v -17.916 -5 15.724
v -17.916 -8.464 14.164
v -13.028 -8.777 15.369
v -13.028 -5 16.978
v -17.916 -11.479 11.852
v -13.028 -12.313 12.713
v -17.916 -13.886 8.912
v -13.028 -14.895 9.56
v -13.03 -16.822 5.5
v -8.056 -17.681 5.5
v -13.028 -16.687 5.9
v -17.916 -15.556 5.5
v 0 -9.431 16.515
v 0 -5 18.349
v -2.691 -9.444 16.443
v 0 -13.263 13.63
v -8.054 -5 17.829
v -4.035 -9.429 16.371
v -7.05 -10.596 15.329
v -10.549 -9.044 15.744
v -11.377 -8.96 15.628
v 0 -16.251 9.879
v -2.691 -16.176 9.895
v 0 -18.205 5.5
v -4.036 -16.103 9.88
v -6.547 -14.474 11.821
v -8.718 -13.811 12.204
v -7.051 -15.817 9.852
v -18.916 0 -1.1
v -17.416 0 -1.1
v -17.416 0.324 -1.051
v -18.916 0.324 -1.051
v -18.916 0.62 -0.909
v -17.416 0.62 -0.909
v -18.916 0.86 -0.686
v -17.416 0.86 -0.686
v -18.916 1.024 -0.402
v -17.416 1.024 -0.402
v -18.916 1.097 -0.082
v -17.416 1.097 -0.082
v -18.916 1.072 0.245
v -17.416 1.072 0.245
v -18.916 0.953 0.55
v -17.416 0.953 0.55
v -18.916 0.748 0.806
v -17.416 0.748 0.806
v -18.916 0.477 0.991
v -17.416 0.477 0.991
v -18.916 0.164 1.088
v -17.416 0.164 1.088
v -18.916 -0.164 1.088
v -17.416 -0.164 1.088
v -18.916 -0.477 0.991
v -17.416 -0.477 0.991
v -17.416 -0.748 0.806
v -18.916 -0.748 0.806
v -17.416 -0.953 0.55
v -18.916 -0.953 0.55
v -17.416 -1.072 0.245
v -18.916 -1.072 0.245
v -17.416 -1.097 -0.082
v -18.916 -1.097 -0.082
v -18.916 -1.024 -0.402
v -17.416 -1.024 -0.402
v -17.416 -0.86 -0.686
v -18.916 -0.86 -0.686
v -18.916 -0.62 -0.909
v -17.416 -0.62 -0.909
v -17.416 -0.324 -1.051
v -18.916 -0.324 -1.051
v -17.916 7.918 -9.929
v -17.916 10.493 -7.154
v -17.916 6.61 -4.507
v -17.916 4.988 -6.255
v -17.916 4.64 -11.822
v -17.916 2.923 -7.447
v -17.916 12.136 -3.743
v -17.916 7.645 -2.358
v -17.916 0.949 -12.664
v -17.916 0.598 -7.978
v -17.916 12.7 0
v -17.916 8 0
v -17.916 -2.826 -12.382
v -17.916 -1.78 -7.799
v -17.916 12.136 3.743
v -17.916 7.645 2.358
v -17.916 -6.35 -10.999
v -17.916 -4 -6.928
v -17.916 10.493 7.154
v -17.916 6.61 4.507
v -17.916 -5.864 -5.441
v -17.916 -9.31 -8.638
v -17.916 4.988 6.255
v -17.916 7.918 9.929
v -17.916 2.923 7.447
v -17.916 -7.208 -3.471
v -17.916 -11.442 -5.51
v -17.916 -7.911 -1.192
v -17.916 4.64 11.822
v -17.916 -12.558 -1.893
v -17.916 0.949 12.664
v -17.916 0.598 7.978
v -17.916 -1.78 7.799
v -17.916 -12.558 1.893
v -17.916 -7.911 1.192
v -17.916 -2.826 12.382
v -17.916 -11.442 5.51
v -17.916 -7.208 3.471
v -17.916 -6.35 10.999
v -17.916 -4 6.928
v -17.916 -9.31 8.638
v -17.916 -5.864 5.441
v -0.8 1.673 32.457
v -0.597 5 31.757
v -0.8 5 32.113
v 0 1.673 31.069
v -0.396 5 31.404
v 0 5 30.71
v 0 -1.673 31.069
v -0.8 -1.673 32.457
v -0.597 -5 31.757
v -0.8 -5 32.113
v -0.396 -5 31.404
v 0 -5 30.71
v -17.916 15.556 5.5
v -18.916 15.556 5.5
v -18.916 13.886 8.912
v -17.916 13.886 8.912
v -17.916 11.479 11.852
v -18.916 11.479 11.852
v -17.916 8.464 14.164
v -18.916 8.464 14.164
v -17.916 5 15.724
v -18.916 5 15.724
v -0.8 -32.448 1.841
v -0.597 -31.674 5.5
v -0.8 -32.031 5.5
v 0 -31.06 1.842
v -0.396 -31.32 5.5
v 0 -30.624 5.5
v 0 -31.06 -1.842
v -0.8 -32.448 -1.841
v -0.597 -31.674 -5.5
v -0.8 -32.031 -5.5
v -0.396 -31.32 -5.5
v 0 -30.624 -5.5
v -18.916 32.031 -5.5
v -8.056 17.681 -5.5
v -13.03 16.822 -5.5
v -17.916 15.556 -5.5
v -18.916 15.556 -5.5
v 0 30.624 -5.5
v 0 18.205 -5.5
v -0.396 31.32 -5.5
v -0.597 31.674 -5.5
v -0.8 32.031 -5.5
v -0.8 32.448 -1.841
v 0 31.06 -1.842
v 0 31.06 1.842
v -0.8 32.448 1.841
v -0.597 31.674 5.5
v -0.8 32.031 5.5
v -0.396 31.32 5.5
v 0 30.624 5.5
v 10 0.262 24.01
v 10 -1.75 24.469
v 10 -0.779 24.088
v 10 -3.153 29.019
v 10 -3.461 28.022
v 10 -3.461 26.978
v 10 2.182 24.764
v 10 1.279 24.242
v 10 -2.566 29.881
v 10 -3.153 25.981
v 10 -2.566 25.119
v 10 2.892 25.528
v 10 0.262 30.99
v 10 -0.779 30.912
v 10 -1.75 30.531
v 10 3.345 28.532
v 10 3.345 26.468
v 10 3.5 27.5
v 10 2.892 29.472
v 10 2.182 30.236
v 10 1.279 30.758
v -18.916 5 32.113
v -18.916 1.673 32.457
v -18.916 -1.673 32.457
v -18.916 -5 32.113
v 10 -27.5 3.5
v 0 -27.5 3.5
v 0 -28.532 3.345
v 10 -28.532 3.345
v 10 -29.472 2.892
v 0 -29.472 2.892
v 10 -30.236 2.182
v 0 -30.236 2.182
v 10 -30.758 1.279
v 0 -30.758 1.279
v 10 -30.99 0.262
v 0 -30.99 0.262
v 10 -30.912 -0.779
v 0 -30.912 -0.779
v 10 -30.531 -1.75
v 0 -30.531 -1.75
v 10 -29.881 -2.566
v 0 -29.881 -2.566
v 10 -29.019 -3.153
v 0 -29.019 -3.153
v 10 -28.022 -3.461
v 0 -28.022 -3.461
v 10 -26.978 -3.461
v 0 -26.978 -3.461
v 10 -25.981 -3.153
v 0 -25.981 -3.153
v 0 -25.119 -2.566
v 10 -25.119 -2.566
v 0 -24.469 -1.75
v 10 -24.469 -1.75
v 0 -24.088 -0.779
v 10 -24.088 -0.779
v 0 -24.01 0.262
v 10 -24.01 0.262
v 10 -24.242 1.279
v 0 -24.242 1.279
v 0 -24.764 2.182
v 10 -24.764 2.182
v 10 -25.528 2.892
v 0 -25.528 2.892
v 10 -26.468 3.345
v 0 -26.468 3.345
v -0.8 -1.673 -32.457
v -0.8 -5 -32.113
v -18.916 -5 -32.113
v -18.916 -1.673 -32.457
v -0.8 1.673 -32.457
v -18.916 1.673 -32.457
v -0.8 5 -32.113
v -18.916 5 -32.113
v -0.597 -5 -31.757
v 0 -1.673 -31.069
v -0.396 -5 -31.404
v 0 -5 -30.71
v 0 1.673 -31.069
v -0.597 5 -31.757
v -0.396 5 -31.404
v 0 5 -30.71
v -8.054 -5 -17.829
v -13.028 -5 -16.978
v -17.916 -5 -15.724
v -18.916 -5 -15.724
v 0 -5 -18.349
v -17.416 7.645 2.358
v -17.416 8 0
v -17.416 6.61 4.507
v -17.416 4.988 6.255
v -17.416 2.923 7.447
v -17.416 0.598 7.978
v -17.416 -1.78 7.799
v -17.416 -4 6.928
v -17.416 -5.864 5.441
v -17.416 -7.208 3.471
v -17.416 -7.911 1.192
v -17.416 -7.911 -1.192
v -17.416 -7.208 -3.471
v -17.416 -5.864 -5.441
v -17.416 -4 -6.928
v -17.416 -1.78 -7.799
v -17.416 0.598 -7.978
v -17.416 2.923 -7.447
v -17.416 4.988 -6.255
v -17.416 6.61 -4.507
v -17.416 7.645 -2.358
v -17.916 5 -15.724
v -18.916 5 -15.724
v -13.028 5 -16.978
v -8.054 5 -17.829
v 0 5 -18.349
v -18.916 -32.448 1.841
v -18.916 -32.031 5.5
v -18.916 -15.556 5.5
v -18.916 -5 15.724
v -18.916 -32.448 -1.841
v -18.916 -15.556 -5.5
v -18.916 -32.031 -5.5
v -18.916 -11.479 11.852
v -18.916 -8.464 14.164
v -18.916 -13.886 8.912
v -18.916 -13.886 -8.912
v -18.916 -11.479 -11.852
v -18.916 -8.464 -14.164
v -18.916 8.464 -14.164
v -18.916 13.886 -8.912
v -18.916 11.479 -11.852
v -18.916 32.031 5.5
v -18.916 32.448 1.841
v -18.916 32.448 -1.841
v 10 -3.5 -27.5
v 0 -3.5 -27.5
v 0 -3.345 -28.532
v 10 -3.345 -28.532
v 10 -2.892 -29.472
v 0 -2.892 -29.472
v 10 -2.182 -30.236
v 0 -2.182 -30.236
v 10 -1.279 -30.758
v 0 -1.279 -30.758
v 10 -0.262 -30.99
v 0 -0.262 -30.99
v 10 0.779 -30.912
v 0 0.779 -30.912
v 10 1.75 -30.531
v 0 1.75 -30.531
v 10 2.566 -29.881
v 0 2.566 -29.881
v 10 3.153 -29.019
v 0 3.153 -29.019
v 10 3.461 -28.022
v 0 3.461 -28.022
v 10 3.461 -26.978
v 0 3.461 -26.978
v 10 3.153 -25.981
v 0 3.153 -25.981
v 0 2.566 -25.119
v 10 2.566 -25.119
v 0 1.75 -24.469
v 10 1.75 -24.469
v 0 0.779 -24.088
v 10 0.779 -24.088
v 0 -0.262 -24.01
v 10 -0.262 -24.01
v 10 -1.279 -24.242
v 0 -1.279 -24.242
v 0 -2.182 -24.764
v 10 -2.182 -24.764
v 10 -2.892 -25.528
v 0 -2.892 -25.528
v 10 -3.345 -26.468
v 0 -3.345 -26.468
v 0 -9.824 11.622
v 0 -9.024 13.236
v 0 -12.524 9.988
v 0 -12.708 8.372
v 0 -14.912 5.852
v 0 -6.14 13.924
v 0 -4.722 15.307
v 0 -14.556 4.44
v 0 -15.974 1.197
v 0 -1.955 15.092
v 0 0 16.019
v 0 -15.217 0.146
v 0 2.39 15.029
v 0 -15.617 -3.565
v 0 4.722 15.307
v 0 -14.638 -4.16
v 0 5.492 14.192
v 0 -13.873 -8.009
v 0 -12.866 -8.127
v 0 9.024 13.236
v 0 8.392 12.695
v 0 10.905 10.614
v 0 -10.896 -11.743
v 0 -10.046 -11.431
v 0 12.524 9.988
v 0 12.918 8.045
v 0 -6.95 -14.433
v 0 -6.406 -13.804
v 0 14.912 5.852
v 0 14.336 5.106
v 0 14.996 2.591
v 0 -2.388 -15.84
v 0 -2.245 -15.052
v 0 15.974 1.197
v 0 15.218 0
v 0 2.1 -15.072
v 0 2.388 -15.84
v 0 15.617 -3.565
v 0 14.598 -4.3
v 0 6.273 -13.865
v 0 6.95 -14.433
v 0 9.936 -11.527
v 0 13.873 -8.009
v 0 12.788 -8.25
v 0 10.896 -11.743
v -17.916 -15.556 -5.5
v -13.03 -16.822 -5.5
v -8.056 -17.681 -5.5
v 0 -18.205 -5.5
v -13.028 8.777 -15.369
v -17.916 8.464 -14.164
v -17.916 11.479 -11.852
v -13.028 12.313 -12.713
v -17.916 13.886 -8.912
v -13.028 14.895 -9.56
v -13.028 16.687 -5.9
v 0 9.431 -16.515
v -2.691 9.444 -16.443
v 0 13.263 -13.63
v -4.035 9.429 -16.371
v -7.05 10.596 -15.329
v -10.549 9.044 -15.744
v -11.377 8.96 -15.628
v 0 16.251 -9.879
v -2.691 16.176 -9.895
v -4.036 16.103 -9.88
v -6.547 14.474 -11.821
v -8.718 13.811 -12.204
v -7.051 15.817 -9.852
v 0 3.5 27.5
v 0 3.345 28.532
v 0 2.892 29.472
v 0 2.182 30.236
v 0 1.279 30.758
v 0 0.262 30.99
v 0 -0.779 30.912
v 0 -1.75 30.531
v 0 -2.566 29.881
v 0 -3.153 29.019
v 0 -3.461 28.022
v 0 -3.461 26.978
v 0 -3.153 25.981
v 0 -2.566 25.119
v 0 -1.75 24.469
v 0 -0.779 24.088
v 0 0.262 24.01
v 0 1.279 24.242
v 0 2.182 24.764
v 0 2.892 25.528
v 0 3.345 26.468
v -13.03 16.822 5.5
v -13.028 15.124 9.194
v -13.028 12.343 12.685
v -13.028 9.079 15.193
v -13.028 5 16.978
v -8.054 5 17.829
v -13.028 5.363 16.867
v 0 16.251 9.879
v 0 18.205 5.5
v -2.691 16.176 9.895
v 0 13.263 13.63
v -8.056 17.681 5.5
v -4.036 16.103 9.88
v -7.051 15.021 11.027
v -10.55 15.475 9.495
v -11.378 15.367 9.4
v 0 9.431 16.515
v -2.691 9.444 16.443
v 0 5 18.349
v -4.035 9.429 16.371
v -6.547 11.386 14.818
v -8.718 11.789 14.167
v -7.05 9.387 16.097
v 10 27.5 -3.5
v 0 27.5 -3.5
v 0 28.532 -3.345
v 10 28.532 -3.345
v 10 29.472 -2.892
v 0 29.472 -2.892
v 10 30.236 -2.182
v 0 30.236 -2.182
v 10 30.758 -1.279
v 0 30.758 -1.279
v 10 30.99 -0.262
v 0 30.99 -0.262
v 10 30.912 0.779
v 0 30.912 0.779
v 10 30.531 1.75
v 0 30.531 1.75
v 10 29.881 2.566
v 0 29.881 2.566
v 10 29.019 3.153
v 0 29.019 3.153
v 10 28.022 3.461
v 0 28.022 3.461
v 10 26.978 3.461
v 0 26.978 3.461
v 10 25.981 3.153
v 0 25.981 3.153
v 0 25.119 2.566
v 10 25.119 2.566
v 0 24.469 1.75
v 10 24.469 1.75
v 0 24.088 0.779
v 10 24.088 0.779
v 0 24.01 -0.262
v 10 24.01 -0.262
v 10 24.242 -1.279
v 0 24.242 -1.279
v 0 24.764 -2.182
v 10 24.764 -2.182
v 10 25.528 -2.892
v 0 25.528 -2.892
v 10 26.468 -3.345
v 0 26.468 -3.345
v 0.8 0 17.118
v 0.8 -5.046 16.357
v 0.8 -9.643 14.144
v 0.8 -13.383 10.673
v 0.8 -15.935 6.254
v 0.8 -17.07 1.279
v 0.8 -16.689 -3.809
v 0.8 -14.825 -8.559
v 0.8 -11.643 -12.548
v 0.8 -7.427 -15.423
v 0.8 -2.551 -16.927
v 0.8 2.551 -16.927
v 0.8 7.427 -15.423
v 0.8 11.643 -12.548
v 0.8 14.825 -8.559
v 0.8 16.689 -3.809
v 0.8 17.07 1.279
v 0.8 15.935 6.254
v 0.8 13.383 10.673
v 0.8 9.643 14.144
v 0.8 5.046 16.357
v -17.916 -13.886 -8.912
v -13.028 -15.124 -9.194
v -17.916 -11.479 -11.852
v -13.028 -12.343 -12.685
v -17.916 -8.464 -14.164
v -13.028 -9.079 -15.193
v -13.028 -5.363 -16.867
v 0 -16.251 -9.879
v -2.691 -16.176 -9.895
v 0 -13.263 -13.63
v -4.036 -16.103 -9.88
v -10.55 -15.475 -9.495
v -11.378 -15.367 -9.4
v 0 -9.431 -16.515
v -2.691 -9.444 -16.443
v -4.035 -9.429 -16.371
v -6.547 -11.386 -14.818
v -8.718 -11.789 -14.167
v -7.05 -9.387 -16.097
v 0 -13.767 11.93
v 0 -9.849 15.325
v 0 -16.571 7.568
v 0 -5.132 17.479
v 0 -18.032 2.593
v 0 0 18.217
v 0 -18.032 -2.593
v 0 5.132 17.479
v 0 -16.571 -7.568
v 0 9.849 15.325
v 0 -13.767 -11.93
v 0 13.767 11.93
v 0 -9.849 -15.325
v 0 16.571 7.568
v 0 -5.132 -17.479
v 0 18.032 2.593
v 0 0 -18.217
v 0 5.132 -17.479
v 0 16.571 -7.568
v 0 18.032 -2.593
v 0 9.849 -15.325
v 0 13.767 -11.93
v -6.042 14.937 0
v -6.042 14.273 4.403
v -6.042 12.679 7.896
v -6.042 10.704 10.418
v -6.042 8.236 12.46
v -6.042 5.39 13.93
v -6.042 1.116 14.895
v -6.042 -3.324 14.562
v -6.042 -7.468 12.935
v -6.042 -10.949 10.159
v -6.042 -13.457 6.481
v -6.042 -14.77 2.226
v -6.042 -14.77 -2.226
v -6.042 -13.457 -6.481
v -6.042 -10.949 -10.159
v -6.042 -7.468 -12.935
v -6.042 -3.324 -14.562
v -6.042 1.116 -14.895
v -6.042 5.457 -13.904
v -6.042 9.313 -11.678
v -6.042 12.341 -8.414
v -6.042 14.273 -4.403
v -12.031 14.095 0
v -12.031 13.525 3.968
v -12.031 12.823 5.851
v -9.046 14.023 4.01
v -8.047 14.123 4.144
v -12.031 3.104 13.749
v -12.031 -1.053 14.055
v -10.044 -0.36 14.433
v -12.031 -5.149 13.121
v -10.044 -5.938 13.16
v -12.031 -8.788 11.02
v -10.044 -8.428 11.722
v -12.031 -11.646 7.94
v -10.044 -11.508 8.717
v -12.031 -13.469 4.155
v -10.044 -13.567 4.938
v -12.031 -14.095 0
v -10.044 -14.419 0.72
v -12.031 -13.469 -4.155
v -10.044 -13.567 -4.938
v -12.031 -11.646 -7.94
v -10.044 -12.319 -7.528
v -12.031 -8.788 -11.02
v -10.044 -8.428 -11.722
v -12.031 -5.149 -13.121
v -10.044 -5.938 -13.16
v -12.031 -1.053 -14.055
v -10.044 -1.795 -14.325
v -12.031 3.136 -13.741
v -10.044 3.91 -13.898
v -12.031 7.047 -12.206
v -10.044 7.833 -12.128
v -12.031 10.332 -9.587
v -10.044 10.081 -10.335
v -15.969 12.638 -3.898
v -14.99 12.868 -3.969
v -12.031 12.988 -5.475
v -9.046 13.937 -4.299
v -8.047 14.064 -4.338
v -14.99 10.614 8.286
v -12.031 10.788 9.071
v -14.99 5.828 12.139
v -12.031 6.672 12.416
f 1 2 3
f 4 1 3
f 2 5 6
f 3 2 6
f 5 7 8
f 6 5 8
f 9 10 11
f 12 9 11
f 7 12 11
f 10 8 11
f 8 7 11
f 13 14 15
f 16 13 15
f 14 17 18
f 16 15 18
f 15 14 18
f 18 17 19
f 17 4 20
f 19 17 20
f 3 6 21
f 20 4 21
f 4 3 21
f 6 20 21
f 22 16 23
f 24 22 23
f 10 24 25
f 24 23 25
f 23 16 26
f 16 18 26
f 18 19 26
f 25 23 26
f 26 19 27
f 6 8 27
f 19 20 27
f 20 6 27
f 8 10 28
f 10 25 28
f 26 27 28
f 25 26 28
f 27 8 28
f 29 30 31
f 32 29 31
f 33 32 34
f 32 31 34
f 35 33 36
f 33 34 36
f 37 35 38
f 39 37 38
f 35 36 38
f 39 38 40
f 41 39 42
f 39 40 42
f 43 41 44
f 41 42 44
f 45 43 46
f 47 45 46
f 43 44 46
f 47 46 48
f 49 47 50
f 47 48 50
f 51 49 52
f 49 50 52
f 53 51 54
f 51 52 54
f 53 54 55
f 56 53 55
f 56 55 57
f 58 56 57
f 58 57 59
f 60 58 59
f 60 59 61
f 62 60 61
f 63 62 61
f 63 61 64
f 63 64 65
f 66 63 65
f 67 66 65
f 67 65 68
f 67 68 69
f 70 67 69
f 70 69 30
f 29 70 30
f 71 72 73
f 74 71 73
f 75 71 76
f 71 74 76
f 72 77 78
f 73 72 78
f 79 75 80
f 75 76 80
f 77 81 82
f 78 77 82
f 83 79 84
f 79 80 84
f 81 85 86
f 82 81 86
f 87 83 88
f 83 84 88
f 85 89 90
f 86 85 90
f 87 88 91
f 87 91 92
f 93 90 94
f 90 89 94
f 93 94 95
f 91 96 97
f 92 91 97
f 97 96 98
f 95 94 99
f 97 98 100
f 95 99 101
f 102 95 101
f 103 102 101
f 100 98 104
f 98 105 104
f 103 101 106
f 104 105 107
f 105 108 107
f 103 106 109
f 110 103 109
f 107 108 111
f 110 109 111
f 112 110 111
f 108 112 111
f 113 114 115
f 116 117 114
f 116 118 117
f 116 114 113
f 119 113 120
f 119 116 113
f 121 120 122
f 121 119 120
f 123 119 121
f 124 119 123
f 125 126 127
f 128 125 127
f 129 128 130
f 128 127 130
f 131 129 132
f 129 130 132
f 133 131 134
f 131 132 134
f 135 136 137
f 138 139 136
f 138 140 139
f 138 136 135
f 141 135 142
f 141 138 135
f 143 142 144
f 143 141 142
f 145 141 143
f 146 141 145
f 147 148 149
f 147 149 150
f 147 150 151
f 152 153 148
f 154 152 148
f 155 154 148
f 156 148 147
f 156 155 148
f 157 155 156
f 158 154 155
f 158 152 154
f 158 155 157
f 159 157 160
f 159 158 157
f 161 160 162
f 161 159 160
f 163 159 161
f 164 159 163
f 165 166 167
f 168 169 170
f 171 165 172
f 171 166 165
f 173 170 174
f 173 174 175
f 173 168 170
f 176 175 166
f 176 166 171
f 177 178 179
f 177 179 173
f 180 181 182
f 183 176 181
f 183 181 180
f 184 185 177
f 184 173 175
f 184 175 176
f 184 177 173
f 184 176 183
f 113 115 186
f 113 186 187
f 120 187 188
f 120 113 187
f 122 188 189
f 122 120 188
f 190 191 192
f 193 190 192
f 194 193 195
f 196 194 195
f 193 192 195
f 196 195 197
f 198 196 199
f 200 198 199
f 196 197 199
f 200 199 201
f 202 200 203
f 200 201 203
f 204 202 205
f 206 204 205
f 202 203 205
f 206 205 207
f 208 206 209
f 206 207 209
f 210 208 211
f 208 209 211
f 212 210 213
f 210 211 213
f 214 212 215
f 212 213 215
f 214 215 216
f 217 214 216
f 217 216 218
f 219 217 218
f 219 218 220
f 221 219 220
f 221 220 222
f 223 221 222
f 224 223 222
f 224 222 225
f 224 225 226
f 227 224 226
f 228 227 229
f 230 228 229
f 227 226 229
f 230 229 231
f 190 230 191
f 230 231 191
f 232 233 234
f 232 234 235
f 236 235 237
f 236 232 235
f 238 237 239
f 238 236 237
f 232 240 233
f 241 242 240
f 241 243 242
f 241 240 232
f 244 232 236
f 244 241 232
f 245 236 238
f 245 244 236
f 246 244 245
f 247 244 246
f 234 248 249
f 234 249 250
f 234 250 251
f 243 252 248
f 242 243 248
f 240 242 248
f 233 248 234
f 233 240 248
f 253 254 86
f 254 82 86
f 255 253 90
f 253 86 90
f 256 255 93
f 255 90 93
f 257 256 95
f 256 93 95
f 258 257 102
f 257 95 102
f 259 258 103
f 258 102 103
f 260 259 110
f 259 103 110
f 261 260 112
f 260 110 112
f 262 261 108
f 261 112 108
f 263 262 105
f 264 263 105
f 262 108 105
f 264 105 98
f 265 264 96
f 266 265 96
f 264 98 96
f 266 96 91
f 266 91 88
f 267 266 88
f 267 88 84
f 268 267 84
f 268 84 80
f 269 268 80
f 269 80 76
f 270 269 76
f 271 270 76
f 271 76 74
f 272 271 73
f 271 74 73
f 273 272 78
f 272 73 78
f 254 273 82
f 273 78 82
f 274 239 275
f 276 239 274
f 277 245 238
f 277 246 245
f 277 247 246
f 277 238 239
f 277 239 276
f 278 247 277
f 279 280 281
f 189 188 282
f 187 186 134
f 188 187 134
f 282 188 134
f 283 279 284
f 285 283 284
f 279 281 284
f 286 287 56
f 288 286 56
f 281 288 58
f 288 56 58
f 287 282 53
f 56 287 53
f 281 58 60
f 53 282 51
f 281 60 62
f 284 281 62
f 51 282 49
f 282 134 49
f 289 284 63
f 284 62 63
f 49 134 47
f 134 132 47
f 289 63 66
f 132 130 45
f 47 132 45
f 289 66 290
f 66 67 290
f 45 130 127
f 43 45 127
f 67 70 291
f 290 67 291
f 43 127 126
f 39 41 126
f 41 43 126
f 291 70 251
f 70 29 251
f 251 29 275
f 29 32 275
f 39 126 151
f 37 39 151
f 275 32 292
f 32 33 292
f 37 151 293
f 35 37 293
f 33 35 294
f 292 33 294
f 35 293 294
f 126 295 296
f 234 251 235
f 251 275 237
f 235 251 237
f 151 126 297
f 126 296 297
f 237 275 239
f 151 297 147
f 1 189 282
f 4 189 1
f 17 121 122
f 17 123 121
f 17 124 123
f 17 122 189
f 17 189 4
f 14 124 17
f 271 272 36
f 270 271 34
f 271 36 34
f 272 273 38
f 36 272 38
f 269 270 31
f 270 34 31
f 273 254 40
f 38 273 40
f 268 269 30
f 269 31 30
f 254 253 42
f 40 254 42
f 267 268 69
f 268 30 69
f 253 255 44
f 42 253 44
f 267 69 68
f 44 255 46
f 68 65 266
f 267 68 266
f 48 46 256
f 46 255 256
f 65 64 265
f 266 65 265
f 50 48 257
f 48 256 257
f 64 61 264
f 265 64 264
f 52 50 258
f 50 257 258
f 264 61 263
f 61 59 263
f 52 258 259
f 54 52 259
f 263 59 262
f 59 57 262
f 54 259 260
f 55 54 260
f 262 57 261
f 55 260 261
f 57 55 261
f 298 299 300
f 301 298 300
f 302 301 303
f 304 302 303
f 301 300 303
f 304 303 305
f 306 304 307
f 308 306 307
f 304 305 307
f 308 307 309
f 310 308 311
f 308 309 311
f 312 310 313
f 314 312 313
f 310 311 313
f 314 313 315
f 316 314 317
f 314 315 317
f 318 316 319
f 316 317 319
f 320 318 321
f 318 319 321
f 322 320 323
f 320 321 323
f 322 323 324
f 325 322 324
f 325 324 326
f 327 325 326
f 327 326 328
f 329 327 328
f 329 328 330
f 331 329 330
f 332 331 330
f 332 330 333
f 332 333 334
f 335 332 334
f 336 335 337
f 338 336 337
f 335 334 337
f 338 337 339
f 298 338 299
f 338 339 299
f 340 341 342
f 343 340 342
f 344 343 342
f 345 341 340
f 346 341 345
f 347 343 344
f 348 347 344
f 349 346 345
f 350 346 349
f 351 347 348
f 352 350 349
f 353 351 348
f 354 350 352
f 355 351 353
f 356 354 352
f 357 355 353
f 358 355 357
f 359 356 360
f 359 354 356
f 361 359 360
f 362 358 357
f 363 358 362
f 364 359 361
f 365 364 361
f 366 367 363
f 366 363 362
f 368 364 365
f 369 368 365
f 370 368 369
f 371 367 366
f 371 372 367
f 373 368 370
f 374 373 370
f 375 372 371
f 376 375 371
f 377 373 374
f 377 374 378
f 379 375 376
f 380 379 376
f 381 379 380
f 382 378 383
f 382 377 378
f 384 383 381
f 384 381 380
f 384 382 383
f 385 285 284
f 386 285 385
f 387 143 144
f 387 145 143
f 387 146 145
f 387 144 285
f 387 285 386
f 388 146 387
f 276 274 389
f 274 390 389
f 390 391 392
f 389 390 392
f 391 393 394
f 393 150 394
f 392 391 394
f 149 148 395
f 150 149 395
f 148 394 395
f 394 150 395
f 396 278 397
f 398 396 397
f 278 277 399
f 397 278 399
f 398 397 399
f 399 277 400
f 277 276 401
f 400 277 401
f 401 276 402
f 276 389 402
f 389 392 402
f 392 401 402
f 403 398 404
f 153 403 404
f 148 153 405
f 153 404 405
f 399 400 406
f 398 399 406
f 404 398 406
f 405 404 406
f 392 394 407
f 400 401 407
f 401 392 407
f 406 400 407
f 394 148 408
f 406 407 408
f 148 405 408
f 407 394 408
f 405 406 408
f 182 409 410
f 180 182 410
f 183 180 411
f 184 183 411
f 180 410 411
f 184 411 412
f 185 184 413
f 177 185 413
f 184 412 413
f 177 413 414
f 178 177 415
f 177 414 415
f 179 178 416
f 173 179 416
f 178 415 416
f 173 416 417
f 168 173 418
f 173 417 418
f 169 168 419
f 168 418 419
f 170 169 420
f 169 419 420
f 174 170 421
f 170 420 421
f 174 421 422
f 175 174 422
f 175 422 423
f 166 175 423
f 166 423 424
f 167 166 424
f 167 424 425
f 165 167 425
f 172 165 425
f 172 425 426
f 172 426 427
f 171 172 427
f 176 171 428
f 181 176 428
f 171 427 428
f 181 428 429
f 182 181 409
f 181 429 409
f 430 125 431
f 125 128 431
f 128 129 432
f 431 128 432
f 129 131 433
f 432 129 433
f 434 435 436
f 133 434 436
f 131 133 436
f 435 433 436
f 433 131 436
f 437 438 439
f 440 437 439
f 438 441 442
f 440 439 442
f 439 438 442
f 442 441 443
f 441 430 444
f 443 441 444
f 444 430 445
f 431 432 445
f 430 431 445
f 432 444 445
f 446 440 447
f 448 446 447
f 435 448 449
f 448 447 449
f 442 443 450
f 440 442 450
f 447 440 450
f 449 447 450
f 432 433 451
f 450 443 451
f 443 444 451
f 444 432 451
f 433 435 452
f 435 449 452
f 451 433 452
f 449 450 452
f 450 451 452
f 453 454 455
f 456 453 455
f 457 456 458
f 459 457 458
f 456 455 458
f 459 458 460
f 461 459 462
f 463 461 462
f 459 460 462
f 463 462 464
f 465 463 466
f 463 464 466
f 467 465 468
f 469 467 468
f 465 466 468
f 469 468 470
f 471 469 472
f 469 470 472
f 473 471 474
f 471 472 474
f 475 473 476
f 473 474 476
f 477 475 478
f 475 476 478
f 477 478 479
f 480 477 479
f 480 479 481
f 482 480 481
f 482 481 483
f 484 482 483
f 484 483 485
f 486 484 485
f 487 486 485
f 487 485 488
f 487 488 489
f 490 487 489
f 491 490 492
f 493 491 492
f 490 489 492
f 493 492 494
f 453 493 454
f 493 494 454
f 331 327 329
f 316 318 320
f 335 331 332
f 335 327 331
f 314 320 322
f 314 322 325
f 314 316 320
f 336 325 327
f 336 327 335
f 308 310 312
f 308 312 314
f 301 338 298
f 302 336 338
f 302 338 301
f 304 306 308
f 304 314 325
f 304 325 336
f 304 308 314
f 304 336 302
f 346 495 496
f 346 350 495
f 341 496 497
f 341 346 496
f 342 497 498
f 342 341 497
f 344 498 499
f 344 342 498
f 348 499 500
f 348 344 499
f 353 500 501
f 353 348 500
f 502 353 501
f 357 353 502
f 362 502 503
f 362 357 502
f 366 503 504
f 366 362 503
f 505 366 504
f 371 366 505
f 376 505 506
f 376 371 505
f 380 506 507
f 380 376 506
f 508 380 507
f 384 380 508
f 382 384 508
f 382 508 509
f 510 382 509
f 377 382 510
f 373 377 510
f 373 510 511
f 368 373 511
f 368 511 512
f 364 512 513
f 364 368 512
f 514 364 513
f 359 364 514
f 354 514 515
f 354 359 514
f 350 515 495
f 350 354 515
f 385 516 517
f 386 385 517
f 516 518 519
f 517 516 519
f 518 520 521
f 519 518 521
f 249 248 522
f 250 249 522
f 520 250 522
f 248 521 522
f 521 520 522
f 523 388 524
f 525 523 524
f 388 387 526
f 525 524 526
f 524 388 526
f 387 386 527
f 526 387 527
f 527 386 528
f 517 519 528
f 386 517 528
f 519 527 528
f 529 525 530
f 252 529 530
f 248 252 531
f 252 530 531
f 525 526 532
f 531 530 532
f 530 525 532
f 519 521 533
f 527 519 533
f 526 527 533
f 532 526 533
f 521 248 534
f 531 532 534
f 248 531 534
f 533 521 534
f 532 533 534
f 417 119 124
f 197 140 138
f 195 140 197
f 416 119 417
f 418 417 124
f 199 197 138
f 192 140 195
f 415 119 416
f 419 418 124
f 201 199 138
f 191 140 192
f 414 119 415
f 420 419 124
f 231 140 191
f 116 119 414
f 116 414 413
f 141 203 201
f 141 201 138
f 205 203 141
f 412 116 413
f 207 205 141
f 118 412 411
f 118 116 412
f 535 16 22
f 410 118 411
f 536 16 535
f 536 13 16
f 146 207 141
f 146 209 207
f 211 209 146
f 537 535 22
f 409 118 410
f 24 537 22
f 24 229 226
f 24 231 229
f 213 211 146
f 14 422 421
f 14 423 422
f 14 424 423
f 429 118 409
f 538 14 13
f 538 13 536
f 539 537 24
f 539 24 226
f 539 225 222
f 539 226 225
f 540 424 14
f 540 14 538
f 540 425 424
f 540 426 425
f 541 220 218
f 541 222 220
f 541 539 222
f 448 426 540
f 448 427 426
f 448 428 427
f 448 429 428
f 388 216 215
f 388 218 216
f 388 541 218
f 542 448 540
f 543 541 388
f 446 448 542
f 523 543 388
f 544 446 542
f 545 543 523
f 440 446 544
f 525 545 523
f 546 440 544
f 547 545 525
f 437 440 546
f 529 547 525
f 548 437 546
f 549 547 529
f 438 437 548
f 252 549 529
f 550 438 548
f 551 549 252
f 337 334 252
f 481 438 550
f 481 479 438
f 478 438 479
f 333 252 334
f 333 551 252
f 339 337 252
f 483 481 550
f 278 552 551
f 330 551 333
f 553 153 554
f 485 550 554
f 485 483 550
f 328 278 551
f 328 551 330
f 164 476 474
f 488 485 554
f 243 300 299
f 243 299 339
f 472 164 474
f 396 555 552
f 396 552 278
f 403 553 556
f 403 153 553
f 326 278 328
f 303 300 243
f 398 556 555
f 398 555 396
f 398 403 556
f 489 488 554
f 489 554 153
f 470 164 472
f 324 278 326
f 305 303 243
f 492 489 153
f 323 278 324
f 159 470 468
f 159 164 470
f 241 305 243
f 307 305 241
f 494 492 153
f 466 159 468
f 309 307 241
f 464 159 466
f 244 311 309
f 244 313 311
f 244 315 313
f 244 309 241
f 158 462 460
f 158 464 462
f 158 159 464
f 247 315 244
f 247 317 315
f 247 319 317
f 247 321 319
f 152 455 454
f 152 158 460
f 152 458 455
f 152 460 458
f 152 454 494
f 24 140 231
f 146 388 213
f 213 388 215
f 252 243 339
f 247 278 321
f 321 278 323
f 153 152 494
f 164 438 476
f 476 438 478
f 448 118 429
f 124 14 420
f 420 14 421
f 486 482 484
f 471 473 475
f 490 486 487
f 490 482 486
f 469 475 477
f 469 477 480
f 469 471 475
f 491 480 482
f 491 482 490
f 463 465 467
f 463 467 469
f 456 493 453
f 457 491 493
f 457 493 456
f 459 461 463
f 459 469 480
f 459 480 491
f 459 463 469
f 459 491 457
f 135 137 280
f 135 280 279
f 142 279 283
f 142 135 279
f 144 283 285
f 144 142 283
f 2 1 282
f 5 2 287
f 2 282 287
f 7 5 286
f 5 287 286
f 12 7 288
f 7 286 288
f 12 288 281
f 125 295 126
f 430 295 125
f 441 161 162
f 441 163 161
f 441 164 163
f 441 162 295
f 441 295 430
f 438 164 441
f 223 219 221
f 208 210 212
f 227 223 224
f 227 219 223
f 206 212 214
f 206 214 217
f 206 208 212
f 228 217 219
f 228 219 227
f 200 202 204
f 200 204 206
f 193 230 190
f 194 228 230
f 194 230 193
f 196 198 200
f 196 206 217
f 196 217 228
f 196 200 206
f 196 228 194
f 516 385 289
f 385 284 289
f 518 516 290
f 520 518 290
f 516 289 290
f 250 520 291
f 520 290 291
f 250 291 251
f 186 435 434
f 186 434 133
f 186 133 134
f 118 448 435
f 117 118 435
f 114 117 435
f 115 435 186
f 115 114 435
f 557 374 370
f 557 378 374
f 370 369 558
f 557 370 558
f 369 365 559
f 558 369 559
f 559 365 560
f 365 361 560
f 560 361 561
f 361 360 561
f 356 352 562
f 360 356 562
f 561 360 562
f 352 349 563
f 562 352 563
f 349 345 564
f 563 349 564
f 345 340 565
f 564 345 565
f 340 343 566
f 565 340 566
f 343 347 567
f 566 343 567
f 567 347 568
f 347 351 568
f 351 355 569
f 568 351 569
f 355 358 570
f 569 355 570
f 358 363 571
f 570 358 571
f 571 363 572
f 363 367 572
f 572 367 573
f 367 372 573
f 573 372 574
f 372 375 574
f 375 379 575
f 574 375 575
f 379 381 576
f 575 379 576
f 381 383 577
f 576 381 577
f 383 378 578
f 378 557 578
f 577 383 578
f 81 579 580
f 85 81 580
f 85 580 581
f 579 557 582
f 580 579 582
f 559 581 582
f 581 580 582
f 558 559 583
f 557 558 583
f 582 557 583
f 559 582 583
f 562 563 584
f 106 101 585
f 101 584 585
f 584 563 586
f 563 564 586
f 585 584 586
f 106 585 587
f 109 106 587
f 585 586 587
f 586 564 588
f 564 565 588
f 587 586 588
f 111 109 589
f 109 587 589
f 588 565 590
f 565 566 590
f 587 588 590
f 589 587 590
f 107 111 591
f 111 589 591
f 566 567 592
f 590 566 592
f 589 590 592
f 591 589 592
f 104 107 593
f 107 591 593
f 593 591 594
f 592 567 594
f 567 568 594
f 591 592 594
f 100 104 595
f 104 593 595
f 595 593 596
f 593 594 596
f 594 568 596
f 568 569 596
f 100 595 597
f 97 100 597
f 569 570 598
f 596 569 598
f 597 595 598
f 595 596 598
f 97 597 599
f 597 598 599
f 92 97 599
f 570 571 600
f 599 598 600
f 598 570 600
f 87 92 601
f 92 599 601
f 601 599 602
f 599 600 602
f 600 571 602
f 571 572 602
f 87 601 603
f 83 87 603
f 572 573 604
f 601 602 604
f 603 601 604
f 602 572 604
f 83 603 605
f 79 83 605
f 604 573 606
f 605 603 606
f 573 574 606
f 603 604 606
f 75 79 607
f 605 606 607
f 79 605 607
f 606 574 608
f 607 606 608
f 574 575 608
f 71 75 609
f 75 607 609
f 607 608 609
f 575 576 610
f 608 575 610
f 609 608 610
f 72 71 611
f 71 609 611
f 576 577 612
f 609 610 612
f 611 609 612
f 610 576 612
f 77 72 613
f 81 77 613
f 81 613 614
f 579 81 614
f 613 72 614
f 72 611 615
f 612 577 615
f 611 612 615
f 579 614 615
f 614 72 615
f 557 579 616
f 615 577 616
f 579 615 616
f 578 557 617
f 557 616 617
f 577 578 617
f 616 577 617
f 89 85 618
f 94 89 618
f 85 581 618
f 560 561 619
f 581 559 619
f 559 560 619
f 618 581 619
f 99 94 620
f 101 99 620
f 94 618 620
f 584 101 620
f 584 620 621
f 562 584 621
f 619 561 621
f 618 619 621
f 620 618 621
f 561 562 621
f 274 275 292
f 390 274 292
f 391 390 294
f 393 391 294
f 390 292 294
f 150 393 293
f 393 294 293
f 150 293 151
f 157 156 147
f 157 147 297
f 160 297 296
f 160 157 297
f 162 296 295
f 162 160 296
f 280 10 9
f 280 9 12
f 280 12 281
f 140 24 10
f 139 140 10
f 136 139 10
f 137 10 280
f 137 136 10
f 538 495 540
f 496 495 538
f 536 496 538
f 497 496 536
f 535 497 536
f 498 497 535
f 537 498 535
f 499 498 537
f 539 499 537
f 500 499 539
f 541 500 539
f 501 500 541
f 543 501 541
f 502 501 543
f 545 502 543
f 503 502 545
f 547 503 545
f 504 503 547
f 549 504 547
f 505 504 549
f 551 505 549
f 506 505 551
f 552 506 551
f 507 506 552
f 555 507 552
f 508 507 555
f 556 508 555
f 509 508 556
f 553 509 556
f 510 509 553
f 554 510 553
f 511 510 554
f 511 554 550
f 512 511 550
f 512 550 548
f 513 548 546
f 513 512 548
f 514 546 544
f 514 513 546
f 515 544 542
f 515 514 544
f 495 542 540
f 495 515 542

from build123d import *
from OCP.BRepFilletAPI import BRepFilletAPI_MakeChamfer

# Parameters (mm, degrees)
BOSS_EXTRUDE1_DEPTH = 18.916428128
SKETCH3_R           = 1.15
CUT_EXTRUDE1_DEPTH  = 17.416428128
CUT_EXTRUDE3_REACH  = 51.702
SKETCH10_R          = 1.1
SKETCH8_R           = 3.5
BOSS_EXTRUDE2_DEPTH = 10
CIRPATTERN2_COUNT   = 4
CHAMFER1_SIZE       = 0.8
CHAMFER1_SIZE2      = 1.385640646


# Read off the part's stored shape, not the designer's step: Roller coating 12, Roller core 12 coated
with BuildPart() as part:
    # Roller coating 12 outline → Roller coating 12 (revolve)
    with BuildSketch(Plane.YX):
        with BuildLine():
            ThreePointArc((12.7, -17.916428128), (15.217989764, 0), (12.7, 17.916428128))
            Line((12.7, 17.916428128), (8, 17.916428128))
            Line((8, 17.916428128), (8, 17.416428128))
            Line((8, 17.416428128), (12.322080058, 17.416428128))
            ThreePointArc((12.322080058, 17.416428128), (14.717989764, 0), (12.322080058, -17.416428128))
            Line((12.322080058, -17.416428128), (8, -17.416428128))
            Line((8, -17.416428128), (8, -17.916428128))
            Line((8, -17.916428128), (12.7, -17.916428128))
        make_face()
    revolve(axis=Axis((0, 0, 0), (1, 0, 0)))


with BuildPart() as body_2:
    # Roller core 12 coated outline → Roller core 12 coated (revolve)
    with BuildSketch(Plane.YX):
        with BuildLine():
            Line((1.15, 17.416428128), (1.15, -17.416428128))
            Line((1.15, -17.416428128), (12.322080058, -17.416428128))
            ThreePointArc((12.322080058, -17.416428128), (14.717989764, 0), (12.322080058, 17.416428128))
            Line((12.322080058, 17.416428128), (1.15, 17.416428128))
        make_face()
    revolve(axis=Axis((0, 0, 0), (1, 0, 0)))


with BuildPart() as part_1:
    add(part.part)

    # Combine1: union body 2
    add(body_2.part)


with BuildPart() as body_2_2:
    # Sketch1 → Revolve1 (revolve)
    with BuildSketch(Plane.XY, mode=Mode.PRIVATE) as revolve1_sk:
        with BuildLine():
            Line((0, 0), (0, 15.217989764))
            Line((0, 15.217989764), (0, 19.017989764))
            ThreePointArc((0, 19.017989764), (-9.046251562, 18.385414232), (-17.916428128, 16.5))
            Line((-17.916428128, 16.5), (-18.916428128, 16.5))
            Line((-18.916428128, 16.5), (-18.916428128, 0))
            Line((-18.916428128, 0), (0, 0))
        make_face()
    revolve(revolve1_sk.sketch.rotate(Axis((-18.916428128, 0, 0), (1, 0, 0)), 270), axis=Axis((-18.916428128, 0, 0), (1, 0, 0)))

    # Sketch5 → Boss-Extrude1 (add)
    with BuildSketch(Plane(origin=(0, 0, 0), x_dir=(0, 0, -1), z_dir=(1, 0, 0))):
        with BuildLine():
            Line((5.5, -32.031234756), (5.5, -15.556349186))
            ThreePointArc((5.5, -15.556349186), (0, -16.5), (-5.5, -15.556349186))
            Line((-5.5, -15.556349186), (-5.5, -32.031234756))
            ThreePointArc((-5.5, -32.031234756), (0, -32.5), (5.5, -32.031234756))
        make_face()
        with BuildLine():
            Line((-5.5, 32.031234756), (-5.5, 15.556349186))
            ThreePointArc((-5.5, 15.556349186), (0, 16.5), (5.5, 15.556349186))
            Line((5.5, 15.556349186), (5.5, 32.031234756))
            ThreePointArc((5.5, 32.031234756), (0, 32.5), (-5.5, 32.031234756))
        make_face()
        with BuildLine():
            Line((32.113081447, 5), (15.724185194, 5))
            ThreePointArc((15.724185194, 5), (16.5, 0), (15.724185194, -5))
            Line((15.724185194, -5), (32.113081447, -5))
            ThreePointArc((32.113081447, -5), (32.5, 0), (32.113081447, 5))
        make_face()
        with BuildLine():
            Line((-32.113081447, -5), (-15.724185194, -5))
            ThreePointArc((-15.724185194, -5), (-16.5, 0), (-15.724185194, 5))
            Line((-15.724185194, 5), (-32.113081447, 5))
            ThreePointArc((-32.113081447, 5), (-32.5, 0), (-32.113081447, -5))
        make_face()
    extrude(amount=-BOSS_EXTRUDE1_DEPTH)

    # Combine2: cut part
    add(part_1.part, mode=Mode.SUBTRACT)

    # Sketch3 → Cut-Extrude1 (cut)
    with BuildSketch(Plane(origin=(0, 0, 0), x_dir=(0, 0, -1), z_dir=(1, 0, 0))):
        Circle(SKETCH3_R)
    extrude(amount=-CUT_EXTRUDE1_DEPTH, mode=Mode.SUBTRACT)

    # Sketch10 → Cut-Extrude3 (cut, up to next)
    with BuildSketch(Plane(origin=(0, 0, 0), x_dir=(0, 0, -1), z_dir=(1, 0, 0)), mode=Mode.PRIVATE) as cut_extrude3_sk1:
        Circle(SKETCH10_R)
    cut_extrude3_tool1 = extrude(cut_extrude3_sk1.sketch, amount=-CUT_EXTRUDE3_REACH, mode=Mode.PRIVATE) & body_2_2.part
    add(cut_extrude3_tool1.solids().sort_by_distance((0, 0, 0))[0], mode=Mode.SUBTRACT)

    # Sketch4 → Revolve2 (revolve)
    with BuildSketch(Plane.XY, mode=Mode.PRIVATE) as revolve2_sk:
        Polygon((0, 18.216989764), (0.8, 17.117989764), (0, 16.018989764), align=None)
    revolve(revolve2_sk.sketch.rotate(Axis((-18.916428128, 0, 0), (1, 0, 0)), 90), axis=Axis((-18.916428128, 0, 0), (1, 0, 0)))

    # Sketch8 → Boss-Extrude2 (add)
    with BuildSketch(Plane(origin=(0, 0, 0), x_dir=(0, 0, -1), z_dir=(1, 0, 0))):
        with Locations(Location((0, -27.5, 0), (0, 0, 180))):
            Circle(SKETCH8_R)
    boss_extrude2 = extrude(amount=BOSS_EXTRUDE2_DEPTH)

    # CirPattern2: Boss-Extrude2 ×4 about axis
    cirpattern2_axis = Axis((0, 0, 0), (1, 0, 0))
    for i in range(1, CIRPATTERN2_COUNT):
        add(boss_extrude2.rotate(cirpattern2_axis, i * 360 / CIRPATTERN2_COUNT))

    # Chamfer1: one chamfer whose edges measure the first distance from different faces: ONE call of the kernel's chamfer builder (chamfer() names one face for all edges)
    chamfer1_edges_1 = [body_2_2.edges().sort_by_distance(p)[0] for p in [
        (0, -32.5, 0),
    ]]
    chamfer1_side_1 = [body_2_2.faces().sort_by_distance(p)[0] for p in [
        (-9.458214064, -32.5, 0),
    ]]
    chamfer1_edges_2 = [body_2_2.edges().sort_by_distance(p)[0] for p in [
        (0, 0, -32.5),
    ]]
    chamfer1_side_2 = [body_2_2.faces().sort_by_distance(p)[0] for p in [
        (-9.458214064, 0, -32.5),
    ]]
    chamfer1_edges_3 = [body_2_2.edges().sort_by_distance(p)[0] for p in [
        (0, 32.5, 0),
    ]]
    chamfer1_side_3 = [body_2_2.faces().sort_by_distance(p)[0] for p in [
        (-9.458214064, 32.5, 0),
    ]]
    chamfer1_edges_4 = [body_2_2.edges().sort_by_distance(p)[0] for p in [
        (0, 0, 32.5),
    ]]
    chamfer1_side_4 = [body_2_2.faces().sort_by_distance(p)[0] for p in [
        (-9.458214064, 0, 32.5),
    ]]
    chamfer1 = BRepFilletAPI_MakeChamfer(body_2_2.part.solid().wrapped)
    for e in chamfer1_edges_1:
        chamfer1.Add(CHAMFER1_SIZE, CHAMFER1_SIZE2, e.wrapped, chamfer1_side_1[0].wrapped)  # the first distance lies on this face
    for e in chamfer1_edges_2:
        chamfer1.Add(CHAMFER1_SIZE, CHAMFER1_SIZE2, e.wrapped, chamfer1_side_2[0].wrapped)  # the first distance lies on this face
    for e in chamfer1_edges_3:
        chamfer1.Add(CHAMFER1_SIZE, CHAMFER1_SIZE2, e.wrapped, chamfer1_side_3[0].wrapped)  # the first distance lies on this face
    for e in chamfer1_edges_4:
        chamfer1.Add(CHAMFER1_SIZE, CHAMFER1_SIZE2, e.wrapped, chamfer1_side_4[0].wrapped)  # the first distance lies on this face
    add(Compound.cast(chamfer1.Shape()), mode=Mode.REPLACE)


solid = body_2_2.part
